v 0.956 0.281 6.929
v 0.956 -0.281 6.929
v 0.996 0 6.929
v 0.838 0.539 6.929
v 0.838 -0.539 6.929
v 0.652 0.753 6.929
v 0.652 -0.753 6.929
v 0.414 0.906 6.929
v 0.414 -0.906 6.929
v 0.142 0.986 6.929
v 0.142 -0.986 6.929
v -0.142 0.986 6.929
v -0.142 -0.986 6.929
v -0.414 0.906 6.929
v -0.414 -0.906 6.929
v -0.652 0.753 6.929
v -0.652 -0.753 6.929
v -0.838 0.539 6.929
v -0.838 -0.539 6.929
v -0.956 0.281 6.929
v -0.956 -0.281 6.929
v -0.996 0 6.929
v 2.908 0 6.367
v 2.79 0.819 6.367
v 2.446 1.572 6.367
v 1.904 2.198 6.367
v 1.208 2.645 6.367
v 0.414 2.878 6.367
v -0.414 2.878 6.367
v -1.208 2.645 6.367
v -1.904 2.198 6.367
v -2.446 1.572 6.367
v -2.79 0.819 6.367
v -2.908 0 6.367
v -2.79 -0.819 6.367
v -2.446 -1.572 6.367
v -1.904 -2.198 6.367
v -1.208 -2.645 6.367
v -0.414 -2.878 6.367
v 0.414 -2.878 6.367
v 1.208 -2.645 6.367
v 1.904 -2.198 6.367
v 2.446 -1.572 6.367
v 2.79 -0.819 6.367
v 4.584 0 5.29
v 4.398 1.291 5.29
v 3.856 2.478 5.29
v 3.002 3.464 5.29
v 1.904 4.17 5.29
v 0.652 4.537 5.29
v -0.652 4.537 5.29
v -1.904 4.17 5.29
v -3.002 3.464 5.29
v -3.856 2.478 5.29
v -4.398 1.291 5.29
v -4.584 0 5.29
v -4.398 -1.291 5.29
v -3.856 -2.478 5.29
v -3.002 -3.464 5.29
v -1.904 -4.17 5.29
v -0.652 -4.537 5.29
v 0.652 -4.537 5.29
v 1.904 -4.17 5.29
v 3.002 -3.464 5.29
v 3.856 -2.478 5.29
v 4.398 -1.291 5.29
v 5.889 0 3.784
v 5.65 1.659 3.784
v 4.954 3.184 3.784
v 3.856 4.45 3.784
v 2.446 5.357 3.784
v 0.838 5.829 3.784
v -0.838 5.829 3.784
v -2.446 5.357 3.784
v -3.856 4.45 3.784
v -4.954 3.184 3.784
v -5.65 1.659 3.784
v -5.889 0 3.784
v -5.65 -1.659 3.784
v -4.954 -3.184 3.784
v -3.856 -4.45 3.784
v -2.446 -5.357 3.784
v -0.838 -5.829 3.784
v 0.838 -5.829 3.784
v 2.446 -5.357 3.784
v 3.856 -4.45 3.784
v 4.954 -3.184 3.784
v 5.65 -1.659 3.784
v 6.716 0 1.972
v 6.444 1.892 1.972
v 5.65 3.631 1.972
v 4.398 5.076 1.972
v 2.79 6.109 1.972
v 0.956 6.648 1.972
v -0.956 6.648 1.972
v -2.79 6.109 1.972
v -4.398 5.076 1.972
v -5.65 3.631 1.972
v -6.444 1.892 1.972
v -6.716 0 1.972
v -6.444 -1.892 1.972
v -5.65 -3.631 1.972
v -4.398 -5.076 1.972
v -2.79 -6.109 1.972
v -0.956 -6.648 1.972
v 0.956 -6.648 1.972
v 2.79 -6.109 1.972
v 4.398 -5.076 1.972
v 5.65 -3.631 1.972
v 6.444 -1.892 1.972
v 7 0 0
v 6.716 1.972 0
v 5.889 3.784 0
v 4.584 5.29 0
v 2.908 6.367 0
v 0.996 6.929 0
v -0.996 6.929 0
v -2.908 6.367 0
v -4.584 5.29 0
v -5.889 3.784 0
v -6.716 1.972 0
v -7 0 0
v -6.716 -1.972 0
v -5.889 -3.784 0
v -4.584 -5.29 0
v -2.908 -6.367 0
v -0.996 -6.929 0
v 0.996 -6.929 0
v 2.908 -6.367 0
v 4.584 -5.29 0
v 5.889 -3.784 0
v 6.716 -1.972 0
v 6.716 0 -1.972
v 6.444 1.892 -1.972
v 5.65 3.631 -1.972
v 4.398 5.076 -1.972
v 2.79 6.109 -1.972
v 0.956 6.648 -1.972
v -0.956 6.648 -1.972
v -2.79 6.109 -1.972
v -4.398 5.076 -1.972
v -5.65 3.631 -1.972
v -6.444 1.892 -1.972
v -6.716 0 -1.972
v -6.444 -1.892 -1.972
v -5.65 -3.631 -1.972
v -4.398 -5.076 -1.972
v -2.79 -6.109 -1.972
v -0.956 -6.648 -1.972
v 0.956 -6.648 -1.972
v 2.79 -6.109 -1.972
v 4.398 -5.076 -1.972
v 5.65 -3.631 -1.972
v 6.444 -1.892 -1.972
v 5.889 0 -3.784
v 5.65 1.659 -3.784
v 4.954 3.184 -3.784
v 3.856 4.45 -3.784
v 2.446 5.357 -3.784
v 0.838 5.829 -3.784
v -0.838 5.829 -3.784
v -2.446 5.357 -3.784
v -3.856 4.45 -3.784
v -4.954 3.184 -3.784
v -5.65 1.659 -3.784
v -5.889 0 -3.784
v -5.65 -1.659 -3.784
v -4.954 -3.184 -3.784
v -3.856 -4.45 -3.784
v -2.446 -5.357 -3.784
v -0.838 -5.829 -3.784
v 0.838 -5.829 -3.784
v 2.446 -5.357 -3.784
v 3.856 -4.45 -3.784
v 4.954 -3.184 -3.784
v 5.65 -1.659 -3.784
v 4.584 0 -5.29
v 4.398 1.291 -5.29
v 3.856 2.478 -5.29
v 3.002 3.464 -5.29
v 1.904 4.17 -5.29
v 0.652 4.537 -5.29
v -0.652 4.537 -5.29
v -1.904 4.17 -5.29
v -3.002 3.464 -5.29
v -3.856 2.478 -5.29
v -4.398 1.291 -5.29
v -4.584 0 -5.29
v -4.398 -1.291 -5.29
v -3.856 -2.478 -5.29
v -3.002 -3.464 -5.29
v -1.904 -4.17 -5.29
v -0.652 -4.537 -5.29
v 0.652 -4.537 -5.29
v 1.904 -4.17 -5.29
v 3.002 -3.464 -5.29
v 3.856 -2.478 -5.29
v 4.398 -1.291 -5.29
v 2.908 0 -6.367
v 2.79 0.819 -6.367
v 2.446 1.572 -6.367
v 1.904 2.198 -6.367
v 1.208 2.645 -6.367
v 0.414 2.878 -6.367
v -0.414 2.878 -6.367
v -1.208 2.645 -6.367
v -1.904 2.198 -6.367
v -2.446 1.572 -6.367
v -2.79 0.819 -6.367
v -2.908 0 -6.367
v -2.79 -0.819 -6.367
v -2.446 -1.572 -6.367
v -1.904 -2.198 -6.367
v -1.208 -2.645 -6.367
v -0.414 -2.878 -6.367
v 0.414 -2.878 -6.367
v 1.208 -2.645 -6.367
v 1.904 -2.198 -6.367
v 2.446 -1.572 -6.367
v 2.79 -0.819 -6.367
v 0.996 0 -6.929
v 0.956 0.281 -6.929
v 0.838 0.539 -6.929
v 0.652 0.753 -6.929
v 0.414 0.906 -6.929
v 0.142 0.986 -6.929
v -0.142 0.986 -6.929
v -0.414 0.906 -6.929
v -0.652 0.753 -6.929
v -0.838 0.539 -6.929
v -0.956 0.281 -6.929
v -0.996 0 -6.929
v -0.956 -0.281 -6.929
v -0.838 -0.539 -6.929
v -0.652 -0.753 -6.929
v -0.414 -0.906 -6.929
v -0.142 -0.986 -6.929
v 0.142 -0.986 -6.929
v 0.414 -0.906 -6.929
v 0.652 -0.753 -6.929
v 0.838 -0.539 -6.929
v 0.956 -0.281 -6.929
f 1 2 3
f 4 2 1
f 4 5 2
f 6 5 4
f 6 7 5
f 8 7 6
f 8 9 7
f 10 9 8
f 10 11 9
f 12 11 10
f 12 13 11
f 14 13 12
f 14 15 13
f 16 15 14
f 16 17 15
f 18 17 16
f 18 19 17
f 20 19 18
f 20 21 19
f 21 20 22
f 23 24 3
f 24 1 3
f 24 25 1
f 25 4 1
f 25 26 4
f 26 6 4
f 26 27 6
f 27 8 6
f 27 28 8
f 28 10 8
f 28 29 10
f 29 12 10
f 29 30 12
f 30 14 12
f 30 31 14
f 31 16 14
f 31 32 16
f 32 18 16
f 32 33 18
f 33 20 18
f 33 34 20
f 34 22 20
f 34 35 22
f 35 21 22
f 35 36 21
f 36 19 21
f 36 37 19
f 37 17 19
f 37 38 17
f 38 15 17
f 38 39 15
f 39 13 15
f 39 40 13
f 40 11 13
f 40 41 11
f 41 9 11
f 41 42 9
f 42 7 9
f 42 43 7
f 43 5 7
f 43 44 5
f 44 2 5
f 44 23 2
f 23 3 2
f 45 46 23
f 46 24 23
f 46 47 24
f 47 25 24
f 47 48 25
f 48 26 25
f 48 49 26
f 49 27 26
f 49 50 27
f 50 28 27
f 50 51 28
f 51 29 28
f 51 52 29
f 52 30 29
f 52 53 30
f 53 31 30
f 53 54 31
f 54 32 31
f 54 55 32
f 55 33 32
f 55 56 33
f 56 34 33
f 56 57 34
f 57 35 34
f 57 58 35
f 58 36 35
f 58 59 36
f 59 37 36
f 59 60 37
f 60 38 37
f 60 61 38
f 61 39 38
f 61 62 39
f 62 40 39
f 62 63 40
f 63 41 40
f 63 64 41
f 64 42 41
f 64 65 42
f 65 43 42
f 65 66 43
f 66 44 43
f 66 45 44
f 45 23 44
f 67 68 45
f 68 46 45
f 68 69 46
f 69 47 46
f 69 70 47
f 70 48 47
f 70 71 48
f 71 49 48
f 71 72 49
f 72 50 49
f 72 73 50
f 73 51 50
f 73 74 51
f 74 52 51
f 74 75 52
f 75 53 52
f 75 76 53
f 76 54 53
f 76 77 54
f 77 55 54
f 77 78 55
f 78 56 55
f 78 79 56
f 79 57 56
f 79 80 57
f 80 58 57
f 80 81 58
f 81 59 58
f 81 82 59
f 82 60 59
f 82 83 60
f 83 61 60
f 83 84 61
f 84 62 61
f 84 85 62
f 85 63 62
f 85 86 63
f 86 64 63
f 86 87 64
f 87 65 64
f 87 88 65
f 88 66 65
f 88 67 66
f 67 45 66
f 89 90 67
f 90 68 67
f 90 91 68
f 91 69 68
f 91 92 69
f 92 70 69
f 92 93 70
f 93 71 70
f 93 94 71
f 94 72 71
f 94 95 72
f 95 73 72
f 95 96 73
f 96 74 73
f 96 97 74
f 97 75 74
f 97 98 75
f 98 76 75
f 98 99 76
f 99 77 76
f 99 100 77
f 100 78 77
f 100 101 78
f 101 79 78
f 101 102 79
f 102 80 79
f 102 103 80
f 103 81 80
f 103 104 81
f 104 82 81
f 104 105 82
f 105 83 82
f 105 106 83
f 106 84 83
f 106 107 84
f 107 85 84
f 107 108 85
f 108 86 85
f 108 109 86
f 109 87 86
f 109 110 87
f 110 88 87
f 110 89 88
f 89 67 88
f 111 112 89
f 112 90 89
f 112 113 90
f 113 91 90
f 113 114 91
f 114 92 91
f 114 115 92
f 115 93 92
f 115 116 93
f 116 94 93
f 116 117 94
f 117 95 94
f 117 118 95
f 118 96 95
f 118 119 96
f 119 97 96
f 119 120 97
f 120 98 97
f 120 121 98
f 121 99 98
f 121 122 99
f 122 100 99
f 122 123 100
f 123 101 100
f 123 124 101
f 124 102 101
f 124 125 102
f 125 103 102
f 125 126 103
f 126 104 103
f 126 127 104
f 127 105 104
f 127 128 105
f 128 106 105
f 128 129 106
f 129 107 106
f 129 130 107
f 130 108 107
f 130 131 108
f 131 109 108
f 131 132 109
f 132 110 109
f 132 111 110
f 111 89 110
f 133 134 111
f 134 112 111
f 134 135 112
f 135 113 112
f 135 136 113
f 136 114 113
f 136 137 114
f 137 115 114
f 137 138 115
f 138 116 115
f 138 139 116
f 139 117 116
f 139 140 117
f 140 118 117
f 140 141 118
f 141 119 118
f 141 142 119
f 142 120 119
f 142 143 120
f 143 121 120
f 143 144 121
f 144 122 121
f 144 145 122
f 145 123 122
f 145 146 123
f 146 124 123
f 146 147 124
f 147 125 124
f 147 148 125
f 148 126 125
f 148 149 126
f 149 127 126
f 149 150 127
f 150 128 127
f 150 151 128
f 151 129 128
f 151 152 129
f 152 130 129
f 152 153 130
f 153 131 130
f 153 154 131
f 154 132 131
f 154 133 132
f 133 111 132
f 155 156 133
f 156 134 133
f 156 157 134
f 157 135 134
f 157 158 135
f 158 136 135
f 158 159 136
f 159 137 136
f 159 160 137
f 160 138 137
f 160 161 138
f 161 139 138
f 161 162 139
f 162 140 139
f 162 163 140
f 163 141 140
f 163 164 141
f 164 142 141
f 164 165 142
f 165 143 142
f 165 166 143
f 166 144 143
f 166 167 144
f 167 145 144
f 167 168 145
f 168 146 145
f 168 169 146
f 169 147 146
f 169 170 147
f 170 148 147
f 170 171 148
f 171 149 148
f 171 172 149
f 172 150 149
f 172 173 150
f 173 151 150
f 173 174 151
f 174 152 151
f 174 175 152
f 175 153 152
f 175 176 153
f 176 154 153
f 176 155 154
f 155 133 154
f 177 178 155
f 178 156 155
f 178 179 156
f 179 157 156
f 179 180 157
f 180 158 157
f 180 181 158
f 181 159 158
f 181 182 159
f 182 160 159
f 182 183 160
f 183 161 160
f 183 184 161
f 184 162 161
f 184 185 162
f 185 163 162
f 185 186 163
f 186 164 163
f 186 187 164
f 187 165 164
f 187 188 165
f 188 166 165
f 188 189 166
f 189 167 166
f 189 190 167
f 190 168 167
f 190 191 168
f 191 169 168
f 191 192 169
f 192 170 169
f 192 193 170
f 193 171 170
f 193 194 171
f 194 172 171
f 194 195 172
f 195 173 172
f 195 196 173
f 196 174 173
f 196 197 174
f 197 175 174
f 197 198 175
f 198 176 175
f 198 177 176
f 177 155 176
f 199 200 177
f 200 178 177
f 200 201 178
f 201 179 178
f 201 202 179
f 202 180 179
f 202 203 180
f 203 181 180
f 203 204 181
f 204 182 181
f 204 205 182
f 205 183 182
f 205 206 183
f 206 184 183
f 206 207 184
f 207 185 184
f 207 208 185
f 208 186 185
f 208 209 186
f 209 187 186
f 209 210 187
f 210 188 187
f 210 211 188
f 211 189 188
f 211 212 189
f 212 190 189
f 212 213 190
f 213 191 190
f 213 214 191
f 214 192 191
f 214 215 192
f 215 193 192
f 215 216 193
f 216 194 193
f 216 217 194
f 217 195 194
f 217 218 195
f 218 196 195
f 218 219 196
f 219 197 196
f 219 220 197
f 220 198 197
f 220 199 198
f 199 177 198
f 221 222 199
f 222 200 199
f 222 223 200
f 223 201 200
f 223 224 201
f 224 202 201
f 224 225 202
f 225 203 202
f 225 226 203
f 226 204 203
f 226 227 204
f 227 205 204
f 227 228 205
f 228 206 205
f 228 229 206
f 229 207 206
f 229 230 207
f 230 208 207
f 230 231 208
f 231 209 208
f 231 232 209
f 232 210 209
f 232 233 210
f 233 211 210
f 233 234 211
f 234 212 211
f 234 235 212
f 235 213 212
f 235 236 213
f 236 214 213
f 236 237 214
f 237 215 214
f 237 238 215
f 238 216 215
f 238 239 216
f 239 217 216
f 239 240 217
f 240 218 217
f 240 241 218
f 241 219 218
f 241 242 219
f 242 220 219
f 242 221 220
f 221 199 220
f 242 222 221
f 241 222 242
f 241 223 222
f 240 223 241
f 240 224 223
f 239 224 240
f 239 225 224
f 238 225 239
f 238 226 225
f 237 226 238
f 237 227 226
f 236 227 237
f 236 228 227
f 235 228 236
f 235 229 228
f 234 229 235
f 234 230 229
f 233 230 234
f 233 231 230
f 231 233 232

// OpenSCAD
// file: ../src/cadence.scad
// as of 2019.05, OpenSCAD understands
// is_num, is_list, is_string, and, is_bool
//
// is_function is coming, but looks tricky



function _normalize_angle(a) =
  ((a >= 0 && a <= 360) ? a : _normalize_angle(a + (a < 0 ? 360 : -360)));


//
// dictionary functions

function _aaget(dict, key, default, off) =
  let (kv = dict[off])
    kv == undef ? default :
    kv[0] == key ? kv[1] :
      _aaget(dict, key, default, off + 1);

function _asget(dict, key, default, off) =
  dict[off] == undef ? default :
  dict[off] == key ? dict[off + 1] :
    _asget(dict, key, default, off + 2);

function _get(dict, key, default=undef) =
  is_string(dict[0]) ?
    _asget(dict, key, default, 0) :
    _aaget(dict, key, default, 0);

function _del(dict, key) =
  [ for (kv = dict) if (kv[0] != key) kv ];

function _put(dict, key, value) =
  concat(_del(dict, key), [ [ key, value ] ]);


function _assoc(arr, key, default, off=0) =
  let (a = arr[off])
    a == undef ? default :
    a[0] == key ? a :
      _assoc(arr, key, default, off + 1);

function _app(arr, entry) =
  concat(_del(arr, entry[0]), [ entry ]);


//
// list functions

function _idx(list, index, default=undef) =
  let (
    i = index < 0 ? len(list) + index : index,
    r = list[i]
  )
    r == undef ? default : r;

  // sublist
  //
function _slist(list, from=0, to) =
  let(
    li = len(list) - 1,
    end = (to == undef ? li : to),
    a0 = from < 0 ? li + 1 + from : from,
    a = a0 < 0 ? 0 : a0,
    z = end < 0 ? li + 1 + end : end
  )
    a > li ? [] :
    z < a ? [] :
      [ for (i = [a:z]) list[i] ];

function _reverse(list) =
  [ for (i = [ len(list) - 1 : -1 : 0 ]) list[i] ];


//
// string functions

function _sstr(s, from=0, length=undef, r="") =
  let(
    i = from < 0 ? len(s) + from : from,
    l = length == undef ? len(s) : length,
    s0 = s[i]
  )
  (s0 == undef || l < 1) ? r :
  str(r, s[i], _sstr(s, i + 1, l - 1));


//
// point functions

  // Accept a single angle instead of [ angle0, angle1 ]
  // 'sp' is the start point
  //
function _to_point(length, angles, sp=[ 0, 0, 0 ]) =
  let(
    as = is_num(angles) ? [ angles, 0 ] : angles,
    inclination = as[0],
    azimuth = as[1] + 90
  )
    sp + [
      length * cos(inclination) * cos(azimuth),
      length * cos(inclination) * sin(azimuth),
      length * sin(inclination) ];

function _to_spherical(point) =
  let(
    l = norm(point),
    ele = asin(point.z / l),
    dir = atan2(point.y, point.x)
  )
    [ l, [ ele, dir - 90 ] ];


function _midpoint(p0, p1, ratio=0.5) =
  let(
    s = _to_spherical(p1 - p0)
  )
    _to_point(ratio * s[0], s[1], p0);

//function _vlen(vector) =
//  sqrt(pow(vector.x, 2) + pow(vector.y, 2) + pow(vector.z, 2));
  //
  // no, use norm(vector)


// inspiration:
// https://climberg.de/post/openscad_bezier_curves_of_any_degrees

function _bezier_choose(n, k) =
  k == 0 ?  1 : (n * _bezier_choose(n - 1, k - 1)) / k;

function _bezier_point(points, t, i, c) =
  len(points) == i ?
    c :
    _bezier_point(
      points,
      t,
      i + 1,
      c +
        _bezier_choose(len(points) - 1, i) *
        pow(t, i) *
        pow(1 - t, len(points) - i - 1) * points[i]);

function _bezier_points(control_points, sample_count) =
  [ for (t = [ 0 : 1.0 / sample_count : 1 ])
    _bezier_point(control_points, t, 0, [ 0, 0, 0 ]) ];


//
// modules

module polypoints(points) {

  for (i = [ 0 : len(points) - 1 ]) {
    translate(points[i]) children(i % $children);
  }
}

module polyhulls(points) {

  for (i = [ 0 : len(points) - 2 ]) {

    hull() {
      translate(points[i]) children(i % $children);
      translate(points[i + 1]) children((i + 1) % $children);
    }
  }
}


// pineapple slice
//
module paslice(radius, depth, slice=45, radius1=0) {

  s = _normalize_angle(slice);
  r = radius;

  if (s > 0) difference() {

    cylinder(depth, r=r);

    translate([ 0, 0, -0.1 ]) cylinder(depth * 1.1, r=radius1);

    if (s != 360) {

      pas = [
        [ 0, r ], [ 0, 0 ] ];
      pbs = [
        [ r, r ], [ r, 0 ], [ r, -r ], [ 0, -r ], [ -r, -r ], [ -r, 0 ],
        [ -r, r ] ];

      t = tan(s);
      tx = t * r;
      ty = r / t;

      translate([ 0, 0, -0.1 ]) linear_extrude(depth + 0.2)
        if (s <= 45)
          polygon(concat(pas, [ [ tx, r ] ], pbs));
        else if (s <= 135)
          polygon(concat(pas, [ [ r, ty ] ], _slist(pbs, 2)));
        else if (s <= 225)
          polygon(concat(pas, [ [ -tx, -r ] ], _slist(pbs, 4)));
        else if (s <= 315)
          polygon(concat(pas, [ [ -r, -ty ] ], _slist(pbs, 6)));
        else if (s < 360)
          polygon(concat(pas, [ [ tx, r ] ]));
    }
  }
}


// dome with optional trunk_height
//
module dome(radius=-1, diameter=-1, trunk_height=0) {

  r = radius < 0 ? diameter / 2 : radius;
  th = trunk_height;

  translate([ 0, 0, th ])
    difference() {
      sphere(r=r);
      translate([ 0, 0, -r ]) cube(2 * r, center=true);
    }
  translate([ 0, 0, th / 2 ])
    cylinder(r=r, h=th, center=true);
}
// main file
//
// test_list.scad
//
// Sat Sep 19 06:29:51 JST 2020
//

use <../src/cadence.scad>;

l = [ 0, 1, 2, 3, 4, "five", 6, undef ];

assert(_idx(l, 1) == 1);
assert(_idx(l, 5) == "five");
assert(_idx(l, 7) == undef);
assert(_idx(l, 7, "other") == "other");
assert(_idx(l, 9) == undef);
assert(_idx(l, 9, "neuf") == "neuf");

assert(_idx(l, -1) == undef);
assert(_idx(l, -2) == 6);
assert(_idx(l, -10) == undef);

assert(_slist(l, 4) == [ 4, "five", 6, undef ]);
assert(_slist(l, 7) == [ undef ]);
assert(_slist(l, 8) == []);

assert(_slist(l, 0, 1) == [ 0, 1 ]);
assert(_slist(l, 0, 2) == [ 0, 1, 2 ]);
assert(_slist(l, 1, 3) == [ 1, 2, 3 ]);

assert(_slist(l, -1) == [ undef ]);
assert(_slist(l, -4) == [ 4, "five", 6, undef ]);

assert(_slist(l, -4, -2) == [ 4, "five", 6 ]);
assert(_slist(l, -4, -3) == [ 4, "five" ]);

assert(_slist(l, -10) == l);
assert(_slist(l, -4, -10) == []);
assert(_slist(l, 10, 11) == []);


//
// SUCCESS, green ball!

color("green") sphere(7);
